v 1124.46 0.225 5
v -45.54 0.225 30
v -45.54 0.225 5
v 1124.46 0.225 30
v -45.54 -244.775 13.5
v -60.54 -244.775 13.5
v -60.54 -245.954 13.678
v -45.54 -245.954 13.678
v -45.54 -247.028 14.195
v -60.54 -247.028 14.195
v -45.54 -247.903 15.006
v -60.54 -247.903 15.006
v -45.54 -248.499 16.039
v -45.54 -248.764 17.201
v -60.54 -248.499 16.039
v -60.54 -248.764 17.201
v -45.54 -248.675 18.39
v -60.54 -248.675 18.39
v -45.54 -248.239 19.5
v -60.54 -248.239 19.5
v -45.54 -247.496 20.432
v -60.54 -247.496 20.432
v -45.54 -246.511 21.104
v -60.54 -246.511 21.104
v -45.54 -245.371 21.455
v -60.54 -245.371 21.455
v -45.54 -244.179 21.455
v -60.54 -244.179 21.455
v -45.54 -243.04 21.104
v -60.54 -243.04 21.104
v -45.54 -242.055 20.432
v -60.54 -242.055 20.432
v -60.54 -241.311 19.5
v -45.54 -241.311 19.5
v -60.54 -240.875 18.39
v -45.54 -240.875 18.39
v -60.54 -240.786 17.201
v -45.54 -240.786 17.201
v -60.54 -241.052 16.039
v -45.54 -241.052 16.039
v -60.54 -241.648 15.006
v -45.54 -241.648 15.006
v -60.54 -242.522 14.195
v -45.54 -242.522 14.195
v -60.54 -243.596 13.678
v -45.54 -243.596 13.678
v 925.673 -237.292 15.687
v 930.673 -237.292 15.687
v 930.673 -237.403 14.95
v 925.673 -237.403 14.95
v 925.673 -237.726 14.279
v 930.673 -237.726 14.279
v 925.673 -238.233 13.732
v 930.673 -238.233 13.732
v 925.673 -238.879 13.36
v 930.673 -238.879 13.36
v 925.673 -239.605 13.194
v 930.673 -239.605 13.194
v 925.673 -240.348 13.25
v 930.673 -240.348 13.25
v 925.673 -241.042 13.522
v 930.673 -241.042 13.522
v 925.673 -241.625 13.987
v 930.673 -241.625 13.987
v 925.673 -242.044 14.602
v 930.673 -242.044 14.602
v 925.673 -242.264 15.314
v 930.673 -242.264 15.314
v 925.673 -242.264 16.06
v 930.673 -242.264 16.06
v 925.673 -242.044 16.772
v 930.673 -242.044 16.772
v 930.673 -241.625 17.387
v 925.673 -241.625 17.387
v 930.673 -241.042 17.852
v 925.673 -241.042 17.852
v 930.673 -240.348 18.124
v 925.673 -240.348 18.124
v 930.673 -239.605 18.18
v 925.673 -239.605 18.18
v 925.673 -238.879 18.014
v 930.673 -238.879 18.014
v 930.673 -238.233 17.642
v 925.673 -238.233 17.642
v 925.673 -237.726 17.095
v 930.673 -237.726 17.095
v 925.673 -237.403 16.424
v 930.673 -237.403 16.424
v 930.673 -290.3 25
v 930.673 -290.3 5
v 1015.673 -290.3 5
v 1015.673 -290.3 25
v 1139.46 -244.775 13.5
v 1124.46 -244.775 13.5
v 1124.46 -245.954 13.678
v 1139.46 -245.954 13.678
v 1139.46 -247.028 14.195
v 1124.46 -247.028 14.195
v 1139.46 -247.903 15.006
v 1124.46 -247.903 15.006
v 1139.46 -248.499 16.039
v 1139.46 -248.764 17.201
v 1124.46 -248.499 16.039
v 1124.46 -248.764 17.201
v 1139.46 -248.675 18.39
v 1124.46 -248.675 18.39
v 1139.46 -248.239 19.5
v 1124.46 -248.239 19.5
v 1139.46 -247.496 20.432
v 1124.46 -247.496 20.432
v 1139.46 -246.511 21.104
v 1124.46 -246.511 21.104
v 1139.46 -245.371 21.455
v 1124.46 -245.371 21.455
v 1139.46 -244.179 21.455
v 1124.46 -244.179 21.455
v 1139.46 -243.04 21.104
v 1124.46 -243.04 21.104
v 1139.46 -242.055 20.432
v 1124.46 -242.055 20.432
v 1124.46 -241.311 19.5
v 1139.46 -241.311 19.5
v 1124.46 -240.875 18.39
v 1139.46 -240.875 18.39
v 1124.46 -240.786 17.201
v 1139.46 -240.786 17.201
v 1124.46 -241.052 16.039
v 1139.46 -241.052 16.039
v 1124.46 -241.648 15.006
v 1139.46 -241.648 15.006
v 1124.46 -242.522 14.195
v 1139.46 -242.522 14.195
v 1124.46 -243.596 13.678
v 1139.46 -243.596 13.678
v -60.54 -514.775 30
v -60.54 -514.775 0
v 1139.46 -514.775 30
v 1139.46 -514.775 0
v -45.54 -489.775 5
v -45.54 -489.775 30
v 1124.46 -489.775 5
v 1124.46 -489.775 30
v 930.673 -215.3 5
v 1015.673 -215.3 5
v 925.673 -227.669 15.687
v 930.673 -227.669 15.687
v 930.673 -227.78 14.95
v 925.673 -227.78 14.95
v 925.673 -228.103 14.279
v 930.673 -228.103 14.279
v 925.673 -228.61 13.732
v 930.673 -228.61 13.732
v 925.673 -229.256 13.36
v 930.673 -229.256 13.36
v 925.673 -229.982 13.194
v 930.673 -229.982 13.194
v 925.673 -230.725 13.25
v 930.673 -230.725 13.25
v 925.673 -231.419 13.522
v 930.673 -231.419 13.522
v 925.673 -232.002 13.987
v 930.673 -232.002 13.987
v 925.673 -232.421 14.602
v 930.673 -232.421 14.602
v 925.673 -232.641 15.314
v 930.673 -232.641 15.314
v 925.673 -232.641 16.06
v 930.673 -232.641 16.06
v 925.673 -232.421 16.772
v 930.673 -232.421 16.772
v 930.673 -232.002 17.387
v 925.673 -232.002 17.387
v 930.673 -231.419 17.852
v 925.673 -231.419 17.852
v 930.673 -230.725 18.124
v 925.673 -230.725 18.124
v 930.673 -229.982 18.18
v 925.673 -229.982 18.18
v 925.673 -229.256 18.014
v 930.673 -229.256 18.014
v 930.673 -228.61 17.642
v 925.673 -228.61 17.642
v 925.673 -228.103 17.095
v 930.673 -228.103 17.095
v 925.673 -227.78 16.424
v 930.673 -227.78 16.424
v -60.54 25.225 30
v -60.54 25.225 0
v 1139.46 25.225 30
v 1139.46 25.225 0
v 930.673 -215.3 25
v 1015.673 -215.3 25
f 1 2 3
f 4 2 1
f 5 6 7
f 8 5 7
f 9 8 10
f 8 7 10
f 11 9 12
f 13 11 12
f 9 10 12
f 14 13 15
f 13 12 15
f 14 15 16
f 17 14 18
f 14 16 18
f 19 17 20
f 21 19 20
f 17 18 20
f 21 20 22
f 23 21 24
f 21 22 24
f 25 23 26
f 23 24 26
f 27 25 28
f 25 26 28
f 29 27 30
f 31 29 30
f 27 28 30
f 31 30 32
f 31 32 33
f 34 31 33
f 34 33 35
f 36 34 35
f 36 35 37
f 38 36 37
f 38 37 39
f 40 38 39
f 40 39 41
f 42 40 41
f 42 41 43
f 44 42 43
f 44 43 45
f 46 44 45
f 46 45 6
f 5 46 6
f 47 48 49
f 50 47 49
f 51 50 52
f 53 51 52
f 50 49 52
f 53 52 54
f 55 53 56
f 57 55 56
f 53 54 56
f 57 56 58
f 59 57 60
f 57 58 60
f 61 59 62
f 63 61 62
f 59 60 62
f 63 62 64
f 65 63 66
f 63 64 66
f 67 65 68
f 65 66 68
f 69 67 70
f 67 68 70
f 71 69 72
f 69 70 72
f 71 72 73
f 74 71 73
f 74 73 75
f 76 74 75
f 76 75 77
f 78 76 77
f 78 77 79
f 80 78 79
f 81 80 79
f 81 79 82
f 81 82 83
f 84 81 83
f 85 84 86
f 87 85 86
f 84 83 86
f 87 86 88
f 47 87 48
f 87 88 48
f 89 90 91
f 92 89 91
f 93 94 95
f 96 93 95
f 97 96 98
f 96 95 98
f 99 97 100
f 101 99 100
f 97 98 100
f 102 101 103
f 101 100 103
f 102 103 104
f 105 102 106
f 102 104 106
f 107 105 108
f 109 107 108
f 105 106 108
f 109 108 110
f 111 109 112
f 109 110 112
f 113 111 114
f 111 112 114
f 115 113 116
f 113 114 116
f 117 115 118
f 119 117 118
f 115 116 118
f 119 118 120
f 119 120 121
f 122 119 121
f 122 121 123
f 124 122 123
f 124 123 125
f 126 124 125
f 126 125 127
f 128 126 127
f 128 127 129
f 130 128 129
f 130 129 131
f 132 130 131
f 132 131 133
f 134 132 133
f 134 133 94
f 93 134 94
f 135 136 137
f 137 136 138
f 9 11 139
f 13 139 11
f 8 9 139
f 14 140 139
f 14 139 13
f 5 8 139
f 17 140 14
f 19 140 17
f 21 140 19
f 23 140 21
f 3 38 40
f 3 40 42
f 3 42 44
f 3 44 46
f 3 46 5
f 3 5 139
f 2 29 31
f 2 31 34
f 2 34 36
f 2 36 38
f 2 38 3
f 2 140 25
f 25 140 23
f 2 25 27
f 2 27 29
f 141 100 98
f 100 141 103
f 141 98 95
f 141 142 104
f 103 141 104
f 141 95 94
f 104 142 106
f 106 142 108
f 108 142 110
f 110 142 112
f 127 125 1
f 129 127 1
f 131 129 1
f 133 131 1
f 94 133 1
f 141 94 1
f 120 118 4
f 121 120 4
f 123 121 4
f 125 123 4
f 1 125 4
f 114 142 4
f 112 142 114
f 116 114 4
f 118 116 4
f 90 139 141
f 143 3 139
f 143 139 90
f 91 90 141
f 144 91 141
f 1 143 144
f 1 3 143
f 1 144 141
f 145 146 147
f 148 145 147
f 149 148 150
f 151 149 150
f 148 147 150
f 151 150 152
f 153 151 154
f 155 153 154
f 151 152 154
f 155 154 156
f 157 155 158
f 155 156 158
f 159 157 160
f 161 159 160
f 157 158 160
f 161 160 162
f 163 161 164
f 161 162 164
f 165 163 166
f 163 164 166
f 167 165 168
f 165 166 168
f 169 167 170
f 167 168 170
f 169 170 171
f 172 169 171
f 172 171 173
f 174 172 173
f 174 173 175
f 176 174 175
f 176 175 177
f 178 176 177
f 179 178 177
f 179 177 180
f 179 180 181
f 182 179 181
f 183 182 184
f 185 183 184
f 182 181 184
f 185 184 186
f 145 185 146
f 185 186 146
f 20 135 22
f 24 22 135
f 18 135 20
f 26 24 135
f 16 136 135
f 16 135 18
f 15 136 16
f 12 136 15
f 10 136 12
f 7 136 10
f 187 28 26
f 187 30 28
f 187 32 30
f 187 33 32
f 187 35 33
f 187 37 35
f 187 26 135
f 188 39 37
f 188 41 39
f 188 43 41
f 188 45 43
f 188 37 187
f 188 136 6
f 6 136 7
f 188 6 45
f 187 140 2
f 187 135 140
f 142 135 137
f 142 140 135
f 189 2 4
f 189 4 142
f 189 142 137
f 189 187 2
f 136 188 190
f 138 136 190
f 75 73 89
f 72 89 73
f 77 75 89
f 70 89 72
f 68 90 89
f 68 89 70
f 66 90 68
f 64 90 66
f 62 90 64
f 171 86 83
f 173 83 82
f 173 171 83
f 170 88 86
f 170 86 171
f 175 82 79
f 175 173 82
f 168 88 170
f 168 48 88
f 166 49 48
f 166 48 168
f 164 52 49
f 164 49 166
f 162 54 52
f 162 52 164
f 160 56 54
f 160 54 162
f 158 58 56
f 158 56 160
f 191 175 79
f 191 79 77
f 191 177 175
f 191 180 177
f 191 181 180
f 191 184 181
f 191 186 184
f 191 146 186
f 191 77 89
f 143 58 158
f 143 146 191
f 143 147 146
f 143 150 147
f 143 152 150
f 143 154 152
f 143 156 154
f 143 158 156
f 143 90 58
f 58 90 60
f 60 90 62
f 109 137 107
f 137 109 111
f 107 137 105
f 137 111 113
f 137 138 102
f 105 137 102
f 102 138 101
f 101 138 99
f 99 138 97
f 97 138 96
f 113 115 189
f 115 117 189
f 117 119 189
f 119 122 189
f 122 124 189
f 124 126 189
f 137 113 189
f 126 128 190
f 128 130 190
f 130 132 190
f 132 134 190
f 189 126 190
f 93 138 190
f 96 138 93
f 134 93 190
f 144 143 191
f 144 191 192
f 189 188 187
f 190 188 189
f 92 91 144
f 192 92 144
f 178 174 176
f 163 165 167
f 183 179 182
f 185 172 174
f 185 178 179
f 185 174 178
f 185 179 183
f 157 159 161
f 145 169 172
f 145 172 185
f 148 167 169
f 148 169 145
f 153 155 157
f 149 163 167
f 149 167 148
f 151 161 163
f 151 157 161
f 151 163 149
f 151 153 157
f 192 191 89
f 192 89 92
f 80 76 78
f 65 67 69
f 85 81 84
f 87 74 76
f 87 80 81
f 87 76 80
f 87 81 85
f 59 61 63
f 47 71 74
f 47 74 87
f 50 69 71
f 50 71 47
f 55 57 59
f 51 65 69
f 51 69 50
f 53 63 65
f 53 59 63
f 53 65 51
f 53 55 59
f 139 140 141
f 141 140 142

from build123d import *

# Parameters (mm, degrees)
SKETCH_1_W          = 1200
SKETCH_1_H          = 540
EXTRUDE_1_DEPTH     = 30
SKETCH_2_W          = 1170
SKETCH_2_H          = 490
CUT_EXTRUDE_1_DEPTH = 25
SKETCH_3_R          = 4
CUT_EXTRUDE_2_DEPTH = 12000
SKETCH_4_W          = 85
SKETCH_4_H          = 75
EXTRUDE_2_DEPTH     = 20
SKETCH_5_R          = 2.5
EXTRUDE_3_DEPTH     = 5


with BuildPart() as part:
    # 草图1 → 凸台-拉伸1 (new body)
    with BuildSketch(Plane.XY):
        with Locations((539.460495659, -244.775206524)):
            Rectangle(SKETCH_1_W, SKETCH_1_H)
    extrude(amount=EXTRUDE_1_DEPTH)

    # 草图2 → 切除-拉伸1 (cut)
    with BuildSketch(Plane.XY.offset(30)):
        with Locations((539.460495659, -244.775206524)):
            Rectangle(SKETCH_2_W, SKETCH_2_H)
    extrude(amount=-CUT_EXTRUDE_1_DEPTH, mode=Mode.SUBTRACT)

    # 草图3 → 切除-拉伸2 (cut)
    with BuildSketch(Plane.ZY.offset(60.539504341)):
        with Locations(Location((17.5, -244.775206524, 0), (0, 0, 180))):
            Circle(SKETCH_3_R)
    extrude(amount=-CUT_EXTRUDE_2_DEPTH, mode=Mode.SUBTRACT)

    # 草图4 → 凸台-拉伸2 (add)
    with BuildSketch(Plane.XY.offset(5)):
        with Locations((973.172943193, -252.800296094)):
            Rectangle(SKETCH_4_W, SKETCH_4_H)
    extrude(amount=EXTRUDE_2_DEPTH)

    # 草图5 → 凸台-拉伸3 (add)
    with BuildSketch(Plane.ZY.offset(-930.672943193)):
        with Locations(Location((15.686983343, -230.168976304, 0), (0, 0, 90))):
            Circle(SKETCH_5_R)
        with Locations(Location((15.686983343, -239.791974012, 0), (0, 0, 90))):
            Circle(SKETCH_5_R)
    extrude(amount=EXTRUDE_3_DEPTH)


solid = part.part
